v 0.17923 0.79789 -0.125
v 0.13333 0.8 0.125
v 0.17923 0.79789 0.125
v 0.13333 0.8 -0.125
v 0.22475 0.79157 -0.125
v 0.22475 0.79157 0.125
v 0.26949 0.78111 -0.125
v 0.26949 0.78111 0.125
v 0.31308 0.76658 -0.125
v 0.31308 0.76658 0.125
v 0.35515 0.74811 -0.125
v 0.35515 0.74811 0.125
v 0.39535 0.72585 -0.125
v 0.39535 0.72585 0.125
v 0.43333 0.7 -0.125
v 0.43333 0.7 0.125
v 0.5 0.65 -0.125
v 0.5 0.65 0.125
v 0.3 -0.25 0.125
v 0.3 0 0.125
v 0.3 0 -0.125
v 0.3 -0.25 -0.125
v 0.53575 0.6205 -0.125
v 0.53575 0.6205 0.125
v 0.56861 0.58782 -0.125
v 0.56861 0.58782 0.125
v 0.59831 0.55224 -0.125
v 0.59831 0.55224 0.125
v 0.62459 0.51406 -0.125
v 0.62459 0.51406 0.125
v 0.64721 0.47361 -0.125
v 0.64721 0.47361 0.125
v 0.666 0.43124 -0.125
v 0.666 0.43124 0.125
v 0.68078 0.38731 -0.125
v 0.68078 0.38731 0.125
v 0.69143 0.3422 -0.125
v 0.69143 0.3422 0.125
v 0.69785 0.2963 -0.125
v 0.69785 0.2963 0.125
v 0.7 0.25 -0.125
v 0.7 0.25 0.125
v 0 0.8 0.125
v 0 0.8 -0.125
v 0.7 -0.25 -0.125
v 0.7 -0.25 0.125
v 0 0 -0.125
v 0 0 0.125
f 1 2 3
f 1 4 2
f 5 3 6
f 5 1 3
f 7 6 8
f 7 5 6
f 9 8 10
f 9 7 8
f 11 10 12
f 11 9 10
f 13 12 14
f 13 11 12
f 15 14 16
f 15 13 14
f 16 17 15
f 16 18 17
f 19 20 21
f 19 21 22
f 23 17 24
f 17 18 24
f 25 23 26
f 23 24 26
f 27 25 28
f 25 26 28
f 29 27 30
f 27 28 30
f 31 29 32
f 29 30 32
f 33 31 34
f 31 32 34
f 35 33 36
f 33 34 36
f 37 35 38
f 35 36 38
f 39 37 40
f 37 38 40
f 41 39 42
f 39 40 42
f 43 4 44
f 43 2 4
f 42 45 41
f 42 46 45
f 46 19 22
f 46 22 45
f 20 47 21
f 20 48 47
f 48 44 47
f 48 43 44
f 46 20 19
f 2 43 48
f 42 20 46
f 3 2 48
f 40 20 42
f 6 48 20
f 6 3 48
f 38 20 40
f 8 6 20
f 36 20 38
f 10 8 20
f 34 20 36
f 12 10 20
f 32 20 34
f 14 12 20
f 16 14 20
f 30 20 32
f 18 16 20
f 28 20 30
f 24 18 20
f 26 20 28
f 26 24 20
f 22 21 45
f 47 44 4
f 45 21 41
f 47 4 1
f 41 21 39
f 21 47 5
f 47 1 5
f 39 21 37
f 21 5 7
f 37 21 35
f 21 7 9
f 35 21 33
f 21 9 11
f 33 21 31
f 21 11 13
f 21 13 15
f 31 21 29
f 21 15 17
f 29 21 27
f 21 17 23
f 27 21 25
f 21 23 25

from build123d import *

# Parameters (mm, degrees)
BOSS_EXTRUDE1_DEPTH = 0.125
FILLET1_R           = 0.5


with BuildPart() as part:
    # frame_outline → Boss-Extrude1 (new, symmetric)
    with BuildSketch(Plane.XY):
        Polygon((0, 0), (0.3, 0), (0.3, -0.25), (0.7, -0.25), (0.7, -0.128713314), (0.7, 0.5), (0.3, 0.8), (0, 0.8), align=None)
    extrude(amount=BOSS_EXTRUDE1_DEPTH, both=True)

    # Fillet1
    fillet1_edges = [part.edges().sort_by_distance(p)[0] for p in [
        (0.3, 0.8, 0),
        (0.7, 0.5, 0),
    ]]
    fillet(fillet1_edges, radius=FILLET1_R)


solid = part.part
